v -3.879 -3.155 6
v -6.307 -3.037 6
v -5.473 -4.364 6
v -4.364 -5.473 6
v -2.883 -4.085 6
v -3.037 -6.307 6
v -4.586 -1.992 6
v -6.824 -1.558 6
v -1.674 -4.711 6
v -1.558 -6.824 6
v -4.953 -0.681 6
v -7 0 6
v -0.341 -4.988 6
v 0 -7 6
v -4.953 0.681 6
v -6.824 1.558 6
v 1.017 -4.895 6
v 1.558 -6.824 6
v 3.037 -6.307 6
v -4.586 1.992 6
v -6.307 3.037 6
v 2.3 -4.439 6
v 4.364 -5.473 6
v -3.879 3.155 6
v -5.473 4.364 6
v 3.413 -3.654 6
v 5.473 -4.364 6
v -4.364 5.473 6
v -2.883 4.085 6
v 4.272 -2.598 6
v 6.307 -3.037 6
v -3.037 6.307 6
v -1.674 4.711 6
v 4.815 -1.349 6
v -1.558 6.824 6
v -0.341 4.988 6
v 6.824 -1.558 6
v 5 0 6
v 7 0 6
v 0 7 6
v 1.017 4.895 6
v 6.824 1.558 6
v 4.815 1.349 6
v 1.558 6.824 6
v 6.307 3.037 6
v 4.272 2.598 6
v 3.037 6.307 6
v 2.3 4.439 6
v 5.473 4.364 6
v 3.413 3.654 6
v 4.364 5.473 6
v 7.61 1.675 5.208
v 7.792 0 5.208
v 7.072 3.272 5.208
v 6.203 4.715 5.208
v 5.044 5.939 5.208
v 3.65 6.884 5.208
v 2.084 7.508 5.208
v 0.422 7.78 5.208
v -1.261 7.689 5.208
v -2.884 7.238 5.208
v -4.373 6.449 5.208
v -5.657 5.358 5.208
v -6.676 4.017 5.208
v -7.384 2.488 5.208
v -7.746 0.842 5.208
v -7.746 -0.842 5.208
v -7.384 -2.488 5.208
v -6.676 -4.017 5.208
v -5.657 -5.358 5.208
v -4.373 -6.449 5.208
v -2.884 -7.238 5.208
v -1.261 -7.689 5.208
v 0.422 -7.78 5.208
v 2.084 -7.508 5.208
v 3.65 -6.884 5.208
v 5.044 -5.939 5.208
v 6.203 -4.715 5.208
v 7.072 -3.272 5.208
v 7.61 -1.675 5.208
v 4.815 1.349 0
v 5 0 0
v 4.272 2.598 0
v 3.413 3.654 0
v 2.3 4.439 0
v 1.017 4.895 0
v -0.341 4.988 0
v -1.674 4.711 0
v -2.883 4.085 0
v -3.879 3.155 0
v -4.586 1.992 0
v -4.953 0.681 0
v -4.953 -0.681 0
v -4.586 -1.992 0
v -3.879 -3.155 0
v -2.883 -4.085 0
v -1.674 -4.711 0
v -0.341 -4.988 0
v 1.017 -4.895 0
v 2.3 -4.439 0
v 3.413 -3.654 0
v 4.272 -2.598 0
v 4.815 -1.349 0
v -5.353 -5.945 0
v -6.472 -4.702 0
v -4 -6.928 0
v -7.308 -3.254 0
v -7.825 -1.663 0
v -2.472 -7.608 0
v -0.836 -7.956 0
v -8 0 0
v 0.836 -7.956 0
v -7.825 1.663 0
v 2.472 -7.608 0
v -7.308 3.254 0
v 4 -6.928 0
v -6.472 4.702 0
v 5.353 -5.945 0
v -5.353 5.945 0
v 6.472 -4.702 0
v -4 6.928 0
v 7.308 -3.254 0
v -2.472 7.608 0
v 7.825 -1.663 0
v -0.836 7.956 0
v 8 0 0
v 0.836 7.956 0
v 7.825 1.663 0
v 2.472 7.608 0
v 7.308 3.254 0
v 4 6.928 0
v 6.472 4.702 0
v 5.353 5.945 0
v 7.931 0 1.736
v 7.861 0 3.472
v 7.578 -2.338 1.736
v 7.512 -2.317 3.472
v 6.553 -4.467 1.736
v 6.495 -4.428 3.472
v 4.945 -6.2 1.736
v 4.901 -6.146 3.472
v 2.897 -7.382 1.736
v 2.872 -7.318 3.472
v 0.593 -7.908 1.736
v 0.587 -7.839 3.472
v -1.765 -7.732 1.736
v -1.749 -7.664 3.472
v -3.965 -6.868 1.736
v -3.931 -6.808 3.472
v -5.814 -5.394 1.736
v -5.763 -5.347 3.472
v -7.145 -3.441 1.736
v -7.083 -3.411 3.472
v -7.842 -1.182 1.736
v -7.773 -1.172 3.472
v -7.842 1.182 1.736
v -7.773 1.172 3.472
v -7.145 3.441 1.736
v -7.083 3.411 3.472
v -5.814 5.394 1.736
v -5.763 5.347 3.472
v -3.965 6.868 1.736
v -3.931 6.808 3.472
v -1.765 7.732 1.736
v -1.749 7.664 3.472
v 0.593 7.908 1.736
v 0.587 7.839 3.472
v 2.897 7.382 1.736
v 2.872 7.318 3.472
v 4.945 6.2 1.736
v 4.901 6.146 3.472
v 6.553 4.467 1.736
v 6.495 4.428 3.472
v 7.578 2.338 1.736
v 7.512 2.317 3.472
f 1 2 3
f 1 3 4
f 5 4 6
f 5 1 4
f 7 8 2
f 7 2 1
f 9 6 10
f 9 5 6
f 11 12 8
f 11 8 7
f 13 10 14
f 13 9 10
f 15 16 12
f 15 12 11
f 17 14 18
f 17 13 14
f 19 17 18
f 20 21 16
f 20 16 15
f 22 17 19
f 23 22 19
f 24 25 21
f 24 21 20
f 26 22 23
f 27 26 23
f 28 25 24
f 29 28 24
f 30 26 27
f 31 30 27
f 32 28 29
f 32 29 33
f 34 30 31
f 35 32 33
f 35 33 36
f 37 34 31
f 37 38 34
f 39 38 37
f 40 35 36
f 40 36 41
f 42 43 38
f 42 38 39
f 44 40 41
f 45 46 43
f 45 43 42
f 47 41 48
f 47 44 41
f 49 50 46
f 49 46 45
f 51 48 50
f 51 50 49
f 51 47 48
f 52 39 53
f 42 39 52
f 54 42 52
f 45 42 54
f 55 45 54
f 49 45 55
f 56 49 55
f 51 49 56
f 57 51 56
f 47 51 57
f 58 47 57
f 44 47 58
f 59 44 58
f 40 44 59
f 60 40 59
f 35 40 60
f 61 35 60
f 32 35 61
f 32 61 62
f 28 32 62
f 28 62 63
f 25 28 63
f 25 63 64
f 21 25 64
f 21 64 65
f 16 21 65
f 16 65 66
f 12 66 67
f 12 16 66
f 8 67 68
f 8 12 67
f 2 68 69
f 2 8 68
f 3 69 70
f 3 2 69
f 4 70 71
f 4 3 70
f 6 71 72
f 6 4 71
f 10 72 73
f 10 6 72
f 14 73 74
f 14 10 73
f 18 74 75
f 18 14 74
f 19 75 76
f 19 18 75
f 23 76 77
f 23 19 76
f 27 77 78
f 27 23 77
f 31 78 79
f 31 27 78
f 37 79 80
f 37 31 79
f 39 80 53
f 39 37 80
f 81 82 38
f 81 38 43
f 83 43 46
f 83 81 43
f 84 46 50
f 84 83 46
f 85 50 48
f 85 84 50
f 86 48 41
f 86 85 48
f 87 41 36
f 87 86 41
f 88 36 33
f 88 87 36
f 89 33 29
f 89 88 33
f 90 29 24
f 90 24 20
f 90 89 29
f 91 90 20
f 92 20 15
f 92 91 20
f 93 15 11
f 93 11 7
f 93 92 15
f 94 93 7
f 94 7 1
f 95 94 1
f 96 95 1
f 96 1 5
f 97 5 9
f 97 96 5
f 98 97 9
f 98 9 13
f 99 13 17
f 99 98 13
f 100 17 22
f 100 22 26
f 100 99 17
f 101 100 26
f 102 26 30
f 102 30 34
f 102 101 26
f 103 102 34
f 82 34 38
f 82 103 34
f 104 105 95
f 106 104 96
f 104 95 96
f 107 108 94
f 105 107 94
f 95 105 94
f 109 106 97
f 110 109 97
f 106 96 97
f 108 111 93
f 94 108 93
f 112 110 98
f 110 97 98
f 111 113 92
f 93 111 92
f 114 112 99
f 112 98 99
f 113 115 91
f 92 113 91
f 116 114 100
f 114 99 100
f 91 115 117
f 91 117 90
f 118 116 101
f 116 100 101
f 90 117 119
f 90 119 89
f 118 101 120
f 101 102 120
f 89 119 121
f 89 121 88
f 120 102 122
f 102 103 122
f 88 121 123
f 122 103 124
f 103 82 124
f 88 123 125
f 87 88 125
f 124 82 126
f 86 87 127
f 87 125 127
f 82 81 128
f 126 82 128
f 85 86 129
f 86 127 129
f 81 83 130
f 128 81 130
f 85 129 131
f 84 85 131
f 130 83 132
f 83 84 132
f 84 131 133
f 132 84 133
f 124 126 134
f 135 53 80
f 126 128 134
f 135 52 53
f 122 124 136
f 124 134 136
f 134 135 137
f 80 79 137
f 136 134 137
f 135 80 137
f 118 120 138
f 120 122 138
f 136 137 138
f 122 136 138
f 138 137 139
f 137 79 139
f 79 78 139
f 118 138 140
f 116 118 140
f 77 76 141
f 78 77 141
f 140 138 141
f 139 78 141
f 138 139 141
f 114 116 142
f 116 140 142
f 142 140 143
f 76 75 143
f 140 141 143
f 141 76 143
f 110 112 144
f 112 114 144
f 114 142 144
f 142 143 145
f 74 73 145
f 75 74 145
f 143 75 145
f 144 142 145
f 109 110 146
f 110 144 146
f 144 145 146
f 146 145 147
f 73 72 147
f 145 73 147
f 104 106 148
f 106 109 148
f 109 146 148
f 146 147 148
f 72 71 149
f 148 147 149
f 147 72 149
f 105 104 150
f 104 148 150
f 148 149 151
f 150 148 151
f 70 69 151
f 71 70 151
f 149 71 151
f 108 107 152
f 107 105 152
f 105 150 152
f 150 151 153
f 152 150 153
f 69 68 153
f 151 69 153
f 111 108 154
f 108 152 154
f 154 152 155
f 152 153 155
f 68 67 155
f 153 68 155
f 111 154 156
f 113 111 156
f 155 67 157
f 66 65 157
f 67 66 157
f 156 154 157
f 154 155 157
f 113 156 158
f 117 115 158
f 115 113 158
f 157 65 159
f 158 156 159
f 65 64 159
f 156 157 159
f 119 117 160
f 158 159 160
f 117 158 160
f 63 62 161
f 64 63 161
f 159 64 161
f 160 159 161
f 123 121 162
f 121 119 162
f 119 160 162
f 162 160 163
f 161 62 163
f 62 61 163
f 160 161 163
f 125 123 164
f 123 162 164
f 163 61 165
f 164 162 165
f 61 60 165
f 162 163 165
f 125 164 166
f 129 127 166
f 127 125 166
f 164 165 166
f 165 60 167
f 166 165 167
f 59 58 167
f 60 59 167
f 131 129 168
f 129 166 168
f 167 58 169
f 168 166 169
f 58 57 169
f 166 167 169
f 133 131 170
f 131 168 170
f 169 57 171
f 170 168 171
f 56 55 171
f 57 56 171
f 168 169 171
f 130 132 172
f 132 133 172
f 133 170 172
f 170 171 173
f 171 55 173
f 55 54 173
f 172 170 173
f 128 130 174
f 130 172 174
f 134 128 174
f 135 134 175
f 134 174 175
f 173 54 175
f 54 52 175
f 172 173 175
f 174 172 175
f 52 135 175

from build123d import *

# Parameters (mm, degrees)
SKETCH_1_R      = 8
SKETCH_1_R_2    = 5
EXTRUDE_1_DEPTH = 6
CHAMFER_1_SIZE  = 1


with BuildPart() as part:
    # Эскиз1 → Вытянуть1 (new body)
    with BuildSketch(Plane.XY):
        Circle(SKETCH_1_R)
        Circle(SKETCH_1_R_2, mode=Mode.SUBTRACT)
    extrude(amount=EXTRUDE_1_DEPTH)

    # Фаска1
    chamfer_1_edges = [part.edges().sort_by_distance(p)[0] for p in [
        (-8, 0, 6),
    ]]
    chamfer(chamfer_1_edges, length=CHAMFER_1_SIZE)

    # Эскиз4 → Вырез-Повернуть1 (revolve, cut)
    with BuildSketch(Plane(origin=(0, 0, 0), x_dir=(0, 0, -1), z_dir=(1, 0, 0)), mode=Mode.PRIVATE) as cut_revolve_1_sk:
        Polygon((0, 8), (-6, 7.76), (-6, 8), align=None)
    revolve(cut_revolve_1_sk.sketch.rotate(Axis((0, 0, 6), (0, 0, -1)), 90), axis=Axis((0, 0, 6), (0, 0, -1)), mode=Mode.SUBTRACT)


solid = part.part
